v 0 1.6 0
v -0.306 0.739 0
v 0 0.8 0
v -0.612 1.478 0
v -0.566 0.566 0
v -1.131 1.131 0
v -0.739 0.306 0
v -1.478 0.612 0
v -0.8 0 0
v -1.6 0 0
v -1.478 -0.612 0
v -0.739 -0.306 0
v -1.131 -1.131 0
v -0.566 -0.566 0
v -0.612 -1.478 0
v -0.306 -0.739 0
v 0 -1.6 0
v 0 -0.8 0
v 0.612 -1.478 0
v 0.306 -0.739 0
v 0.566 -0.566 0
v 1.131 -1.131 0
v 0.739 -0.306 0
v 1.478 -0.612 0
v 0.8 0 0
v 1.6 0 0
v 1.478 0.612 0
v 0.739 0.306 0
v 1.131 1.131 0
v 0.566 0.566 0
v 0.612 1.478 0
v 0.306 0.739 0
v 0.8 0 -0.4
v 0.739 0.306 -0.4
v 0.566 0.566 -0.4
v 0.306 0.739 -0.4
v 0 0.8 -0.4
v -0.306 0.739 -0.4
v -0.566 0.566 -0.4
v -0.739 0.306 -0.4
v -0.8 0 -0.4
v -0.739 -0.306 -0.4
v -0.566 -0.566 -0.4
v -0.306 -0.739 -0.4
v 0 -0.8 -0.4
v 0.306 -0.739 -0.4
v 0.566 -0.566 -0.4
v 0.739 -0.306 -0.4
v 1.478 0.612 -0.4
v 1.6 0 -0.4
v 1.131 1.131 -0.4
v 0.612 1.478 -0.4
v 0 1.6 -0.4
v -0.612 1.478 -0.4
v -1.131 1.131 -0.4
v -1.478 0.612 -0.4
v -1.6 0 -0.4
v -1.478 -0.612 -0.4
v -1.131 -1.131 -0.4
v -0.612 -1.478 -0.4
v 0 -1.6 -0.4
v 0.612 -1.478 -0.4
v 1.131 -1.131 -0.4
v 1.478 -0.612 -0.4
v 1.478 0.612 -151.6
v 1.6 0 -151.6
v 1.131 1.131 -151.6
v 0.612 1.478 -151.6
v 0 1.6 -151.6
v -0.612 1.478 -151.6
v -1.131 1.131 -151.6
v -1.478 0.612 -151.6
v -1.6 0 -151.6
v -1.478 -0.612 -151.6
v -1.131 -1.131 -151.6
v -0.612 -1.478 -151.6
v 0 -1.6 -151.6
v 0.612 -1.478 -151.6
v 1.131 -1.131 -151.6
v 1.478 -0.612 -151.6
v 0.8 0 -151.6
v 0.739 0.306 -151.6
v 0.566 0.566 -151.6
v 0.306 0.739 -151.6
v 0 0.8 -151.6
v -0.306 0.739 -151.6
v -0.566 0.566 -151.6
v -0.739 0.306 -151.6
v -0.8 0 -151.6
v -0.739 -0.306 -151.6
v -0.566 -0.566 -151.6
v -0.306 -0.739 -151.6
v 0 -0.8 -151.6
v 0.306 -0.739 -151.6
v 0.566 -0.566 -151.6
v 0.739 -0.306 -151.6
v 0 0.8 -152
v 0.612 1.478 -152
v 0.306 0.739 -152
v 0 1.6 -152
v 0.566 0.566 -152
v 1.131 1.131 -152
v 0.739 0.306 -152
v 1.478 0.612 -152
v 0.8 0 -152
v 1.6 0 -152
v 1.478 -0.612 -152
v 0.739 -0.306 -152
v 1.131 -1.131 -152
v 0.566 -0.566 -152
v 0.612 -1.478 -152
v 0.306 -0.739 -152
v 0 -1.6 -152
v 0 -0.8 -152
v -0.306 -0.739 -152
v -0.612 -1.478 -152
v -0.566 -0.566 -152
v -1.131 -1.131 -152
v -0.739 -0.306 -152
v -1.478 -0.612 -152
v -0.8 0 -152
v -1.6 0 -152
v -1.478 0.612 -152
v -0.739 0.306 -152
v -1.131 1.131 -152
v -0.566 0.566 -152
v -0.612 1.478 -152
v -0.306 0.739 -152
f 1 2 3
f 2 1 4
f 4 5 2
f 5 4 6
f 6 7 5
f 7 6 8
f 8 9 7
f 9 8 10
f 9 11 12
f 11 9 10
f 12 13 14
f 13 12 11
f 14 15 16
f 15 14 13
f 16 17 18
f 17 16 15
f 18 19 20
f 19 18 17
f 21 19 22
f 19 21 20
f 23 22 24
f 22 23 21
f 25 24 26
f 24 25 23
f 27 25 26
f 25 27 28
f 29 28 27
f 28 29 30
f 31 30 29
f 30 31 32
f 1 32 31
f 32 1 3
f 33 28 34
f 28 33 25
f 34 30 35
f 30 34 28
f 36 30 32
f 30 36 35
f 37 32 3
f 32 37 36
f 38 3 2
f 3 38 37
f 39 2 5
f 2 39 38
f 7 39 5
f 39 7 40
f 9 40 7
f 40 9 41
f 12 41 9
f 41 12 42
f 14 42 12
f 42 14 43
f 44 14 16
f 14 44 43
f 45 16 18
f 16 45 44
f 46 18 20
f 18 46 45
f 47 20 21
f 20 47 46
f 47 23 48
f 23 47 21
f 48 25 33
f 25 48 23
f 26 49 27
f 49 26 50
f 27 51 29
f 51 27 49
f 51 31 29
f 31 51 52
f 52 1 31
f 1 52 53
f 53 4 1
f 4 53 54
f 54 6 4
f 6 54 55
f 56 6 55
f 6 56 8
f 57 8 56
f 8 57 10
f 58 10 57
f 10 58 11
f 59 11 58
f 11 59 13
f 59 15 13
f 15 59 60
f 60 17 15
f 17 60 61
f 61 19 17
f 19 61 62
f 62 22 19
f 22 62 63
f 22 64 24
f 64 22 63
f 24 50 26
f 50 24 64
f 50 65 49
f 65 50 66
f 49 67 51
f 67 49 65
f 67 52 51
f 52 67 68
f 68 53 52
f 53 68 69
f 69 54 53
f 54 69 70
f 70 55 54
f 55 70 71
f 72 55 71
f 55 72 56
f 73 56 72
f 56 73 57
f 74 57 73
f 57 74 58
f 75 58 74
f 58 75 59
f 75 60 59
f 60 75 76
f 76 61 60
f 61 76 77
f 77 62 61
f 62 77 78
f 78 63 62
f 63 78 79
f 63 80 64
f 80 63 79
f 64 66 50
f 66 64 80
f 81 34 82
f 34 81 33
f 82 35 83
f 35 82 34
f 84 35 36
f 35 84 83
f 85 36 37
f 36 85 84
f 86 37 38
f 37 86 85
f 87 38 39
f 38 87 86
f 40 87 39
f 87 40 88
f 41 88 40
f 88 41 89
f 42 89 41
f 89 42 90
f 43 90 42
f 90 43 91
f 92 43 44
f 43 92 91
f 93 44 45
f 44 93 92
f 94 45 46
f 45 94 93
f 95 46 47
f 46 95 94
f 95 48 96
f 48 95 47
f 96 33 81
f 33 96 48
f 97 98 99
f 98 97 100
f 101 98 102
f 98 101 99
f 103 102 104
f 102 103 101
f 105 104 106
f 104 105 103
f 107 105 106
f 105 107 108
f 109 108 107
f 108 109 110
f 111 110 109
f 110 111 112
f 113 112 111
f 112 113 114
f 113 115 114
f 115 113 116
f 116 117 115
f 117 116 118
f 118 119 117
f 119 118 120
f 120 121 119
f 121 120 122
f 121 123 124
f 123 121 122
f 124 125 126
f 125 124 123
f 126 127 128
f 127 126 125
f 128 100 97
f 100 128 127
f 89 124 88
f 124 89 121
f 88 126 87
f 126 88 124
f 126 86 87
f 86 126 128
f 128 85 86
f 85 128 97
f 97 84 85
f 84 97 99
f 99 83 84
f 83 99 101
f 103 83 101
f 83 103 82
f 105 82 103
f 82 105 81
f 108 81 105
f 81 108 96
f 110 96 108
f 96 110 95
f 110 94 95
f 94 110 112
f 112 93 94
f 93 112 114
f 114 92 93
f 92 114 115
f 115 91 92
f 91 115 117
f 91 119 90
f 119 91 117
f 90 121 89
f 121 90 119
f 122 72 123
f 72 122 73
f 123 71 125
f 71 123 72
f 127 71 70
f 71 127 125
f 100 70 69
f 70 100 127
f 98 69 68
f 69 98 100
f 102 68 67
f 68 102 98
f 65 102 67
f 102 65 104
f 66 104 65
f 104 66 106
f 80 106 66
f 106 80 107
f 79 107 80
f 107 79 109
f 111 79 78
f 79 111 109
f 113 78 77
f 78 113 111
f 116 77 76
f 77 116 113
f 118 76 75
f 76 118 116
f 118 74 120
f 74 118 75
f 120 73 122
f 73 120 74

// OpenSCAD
// file: ../p/4-4ring1.scad
use <../lib.scad>
function ldraw_lib__4_4ring1() = [
// 0 Ring  1 x 1.0
// 0 Name: 4-4ring1.dat
// 0 Author: James Jessiman
// 0 !LDRAW_ORG Primitive UPDATE 2009-01
// 0 !LICENSE Licensed under CC BY 2.0 and CC BY 4.0 : see CAreadme.txt
// 
// 0 BFC CERTIFY CCW
  [0,"BFC","CERTIFY"],
  [0,"BFC","CCW"],
// 
// 0 !HISTORY 1998-12-15 [PTadmin] Official Update 1998-10
// 0 !HISTORY 2002-04-08 [BrickCaster] Modified for BFC compliance
// 0 !HISTORY 2002-04-25 [PTadmin] Official Update 2002-02
// 0 !HISTORY 2007-06-24 [PTadmin] Header formatted for Contributor Agreement
// 0 !HISTORY 2008-07-01 [PTadmin] Official Update 2008-01
// 0 !HISTORY 2008-08-26 [cwdee] Switch polygon winding and rename
// 0 !HISTORY 2009-05-02 [PTadmin] Official Update 2009-01
// 
// 
// 4 16 -0.7654 0 1.8478 -0.3827 0 0.9239 0 0 1 0 0 2
  [4,16,-0.7654,0,1.8478,-0.3827,0,0.9239,0,0,1,0,0,2],
// 4 16 -1.4142 0 1.4142 -0.7071 0 0.7071 -0.3827 0 0.9239 -0.7654 0 1.8478
  [4,16,-1.4142,0,1.4142,-0.7071,0,0.7071,-0.3827,0,0.9239,-0.7654,0,1.8478],
// 4 16 -1.8478 0 0.7654 -0.9239 0 0.3827 -0.7071 0 0.7071 -1.4142 0 1.41420
  [4,16,-1.8478,0,0.7654,-0.9239,0,0.3827,-0.7071,0,0.7071,-1.4142,0,1.41420],
// 4 16 -2 0 0 -1 0 0 -0.9239 0 0.3827 -1.8478 0 0.7654
  [4,16,-2,0,0,-1,0,0,-0.9239,0,0.3827,-1.8478,0,0.7654],
// 4 16 -1.8478 0 -0.7654 -0.9239 0 -0.3827 -1 0 0 -2 0 0
  [4,16,-1.8478,0,-0.7654,-0.9239,0,-0.3827,-1,0,0,-2,0,0],
// 4 16 -1.4142 0 -1.4142 -0.7071 0 -0.7071 -0.9239 0 -0.3827 -1.8478 0 -0.7654
  [4,16,-1.4142,0,-1.4142,-0.7071,0,-0.7071,-0.9239,0,-0.3827,-1.8478,0,-0.7654],
// 4 16 -0.7654 0 -1.8478 -0.3827 0 -0.9239 -0.7071 0 -0.7071 -1.4142 0 -1.4142
  [4,16,-0.7654,0,-1.8478,-0.3827,0,-0.9239,-0.7071,0,-0.7071,-1.4142,0,-1.4142],
// 4 16 0 0 -2 0 0 -1 -0.3827 0 -0.9239 -0.7654 0 -1.8478
  [4,16,0,0,-2,0,0,-1,-0.3827,0,-0.9239,-0.7654,0,-1.8478],
// 4 16 0.7654 0 -1.8478 0.3827 0 -0.9239 0 0 -1 0 0 -2
  [4,16,0.7654,0,-1.8478,0.3827,0,-0.9239,0,0,-1,0,0,-2],
// 4 16 1.4142 0 -1.4142 0.7071 0 -0.7071 0.3827 0 -0.9239 0.7654 0 -1.8478
  [4,16,1.4142,0,-1.4142,0.7071,0,-0.7071,0.3827,0,-0.9239,0.7654,0,-1.8478],
// 4 16 1.8478 0 -0.7654 0.9239 0 -0.3827 0.7071 0 -0.7071 1.4142 0 -1.4142
  [4,16,1.8478,0,-0.7654,0.9239,0,-0.3827,0.7071,0,-0.7071,1.4142,0,-1.4142],
// 4 16 2 0 0 1 0 0 0.9239 0 -0.3827 1.8478 0 -0.7654
  [4,16,2,0,0,1,0,0,0.9239,0,-0.3827,1.8478,0,-0.7654],
// 4 16 1.8478 0 0.7654 0.9239 0 0.3827 1 0 0 2 0 0
  [4,16,1.8478,0,0.7654,0.9239,0,0.3827,1,0,0,2,0,0],
// 4 16 1.4142 0 1.4142 0.7071 0 0.7071 0.9239 0 0.3827 1.8478 0 0.7654
  [4,16,1.4142,0,1.4142,0.7071,0,0.7071,0.9239,0,0.3827,1.8478,0,0.7654],
// 4 16 0.7654 0 1.8478 0.3827 0 0.9239 0.7071 0 0.7071 1.4142 0 1.4142
  [4,16,0.7654,0,1.8478,0.3827,0,0.9239,0.7071,0,0.7071,1.4142,0,1.4142],
// 4 16 0 0 2 0 0 1 0.3827 0 0.9239 0.7654 0 1.8478
  [4,16,0,0,2,0,0,1,0.3827,0,0.9239,0.7654,0,1.8478],
// 0
];
makepoly(ldraw_lib__4_4ring1(), line=0.2);
// file: ../p/4-4edge.scad
use <../lib.scad>
function ldraw_lib__4_4edge() = [
// 0 Circle 1.0
// 0 Name: 4-4edge.dat
// 0 Author: James Jessiman
// 0 !LDRAW_ORG Primitive UPDATE 2017-01
// 0 !LICENSE Licensed under CC BY 2.0 and CC BY 4.0 : see CAreadme.txt
// 
// 0 BFC CERTIFY CCW
  [0,"BFC","CERTIFY"],
  [0,"BFC","CCW"],
// 
// 0 !HISTORY 1998-12-15 [PTadmin] Official Update 1998-10
// 0 !HISTORY 2005-12-28 [PTadmin] Official Update 2005-01
// 0 !HISTORY 2007-06-24 [PTadmin] Header formatted for Contributor Agreement
// 0 !HISTORY 2008-07-01 [PTadmin] Official Update 2008-01
// 0 !HISTORY 2017-01-15 [Steffen] BFCed
// 0 !HISTORY 2017-12-30 [PTadmin] Official Update 2017-01
// 
// 
// 2 24 1 0 0 0.9239 0 0.3827
  [2,24,1,0,0,0.9239,0,0.3827],
// 2 24 0.9239 0 0.3827 0.7071 0 0.7071
  [2,24,0.9239,0,0.3827,0.7071,0,0.7071],
// 2 24 0.7071 0 0.7071 0.3827 0 0.9239
  [2,24,0.7071,0,0.7071,0.3827,0,0.9239],
// 2 24 0.3827 0 0.9239 0 0 1
  [2,24,0.3827,0,0.9239,0,0,1],
// 2 24 0 0 1 -0.3827 0 0.9239
  [2,24,0,0,1,-0.3827,0,0.9239],
// 2 24 -0.3827 0 0.9239 -0.7071 0 0.7071
  [2,24,-0.3827,0,0.9239,-0.7071,0,0.7071],
// 2 24 -0.7071 0 0.7071 -0.9239 0 0.3827
  [2,24,-0.7071,0,0.7071,-0.9239,0,0.3827],
// 2 24 -0.9239 0 0.3827 -1 0 -0
  [2,24,-0.9239,0,0.3827,-1,0,-0],
// 2 24 -1 0 -0 -0.9239 0 -0.3827
  [2,24,-1,0,-0,-0.9239,0,-0.3827],
// 2 24 -0.9239 0 -0.3827 -0.7071 0 -0.7071
  [2,24,-0.9239,0,-0.3827,-0.7071,0,-0.7071],
// 2 24 -0.7071 0 -0.7071 -0.3827 0 -0.9239
  [2,24,-0.7071,0,-0.7071,-0.3827,0,-0.9239],
// 2 24 -0.3827 0 -0.9239 0 0 -1
  [2,24,-0.3827,0,-0.9239,0,0,-1],
// 2 24 0 0 -1 0.3827 0 -0.9239
  [2,24,0,0,-1,0.3827,0,-0.9239],
// 2 24 0.3827 0 -0.9239 0.7071 0 -0.7071
  [2,24,0.3827,0,-0.9239,0.7071,0,-0.7071],
// 2 24 0.7071 0 -0.7071 0.9239 0 -0.3827
  [2,24,0.7071,0,-0.7071,0.9239,0,-0.3827],
// 2 24 0.9239 0 -0.3827 1 0 0
  [2,24,0.9239,0,-0.3827,1,0,0],
];
makepoly(ldraw_lib__4_4edge(), line=0.2);
// file: ../p/4-4cyli.scad
use <../lib.scad>
function ldraw_lib__4_4cyli() = [
// 0 Cylinder 1.0
// 0 Name: 4-4cyli.dat
// 0 Author: James Jessiman
// 0 !LDRAW_ORG Primitive UPDATE 2005-01
// 0 !LICENSE Licensed under CC BY 2.0 and CC BY 4.0 : see CAreadme.txt
// 
// 0 BFC CERTIFY CCW
  [0,"BFC","CERTIFY"],
  [0,"BFC","CCW"],
// 
// 0 !HISTORY 1998-12-15 [PTadmin] Official Update 1998-10
// 0 !HISTORY 2002-03-23 [sbliss] Added BFC statement; merged headers from files in distributions LDraw 0.27 and Complete.
// 0 !HISTORY 2002-04-25 [PTadmin] Official Update 2002-02
// 0 !HISTORY 2004-12-14 [guyvivan] BFC CCW
// 0 !HISTORY 2005-12-28 [PTadmin] Official Update 2005-01
// 0 !HISTORY 2007-06-24 [PTadmin] Header formatted for Contributor Agreement
// 0 !HISTORY 2008-07-01 [PTadmin] Official Update 2008-01
// 
// 
// 4 16 1 1 0 0.9239 1 0.3827 0.9239 0 0.3827 1 0 0
  [4,16,1,1,0,0.9239,1,0.3827,0.9239,0,0.3827,1,0,0],
// 5 24 1 0 0 1 1 0 0.9239 0 0.3827 0.9239 0 -0.3827
  [5,24,1,0,0,1,1,0,0.9239,0,0.3827,0.9239,0,-0.3827],
// 4 16 0.9239 1 0.3827 0.7071 1 0.7071 0.7071 0 0.7071 0.9239 0 0.3827
  [4,16,0.9239,1,0.3827,0.7071,1,0.7071,0.7071,0,0.7071,0.9239,0,0.3827],
// 5 24 0.9239 0 0.3827 0.9239 1 0.3827 0.7071 0 0.7071 1 0 0
  [5,24,0.9239,0,0.3827,0.9239,1,0.3827,0.7071,0,0.7071,1,0,0],
// 4 16 0.7071 1 0.7071 0.3827 1 0.9239 0.3827 0 0.9239 0.7071 0 0.7071
  [4,16,0.7071,1,0.7071,0.3827,1,0.9239,0.3827,0,0.9239,0.7071,0,0.7071],
// 5 24 0.7071 0 0.7071 0.7071 1 0.7071 0.3827 0 0.9239 0.9239 0 0.3827
  [5,24,0.7071,0,0.7071,0.7071,1,0.7071,0.3827,0,0.9239,0.9239,0,0.3827],
// 4 16 0.3827 1 0.9239 0 1 1 0 0 1 0.3827 0 0.9239
  [4,16,0.3827,1,0.9239,0,1,1,0,0,1,0.3827,0,0.9239],
// 5 24 0.3827 0 0.9239 0.3827 1 0.9239 0 0 1 0.7071 0 0.7071
  [5,24,0.3827,0,0.9239,0.3827,1,0.9239,0,0,1,0.7071,0,0.7071],
// 4 16 0 1 1 -0.3827 1 0.9239 -0.3827 0 0.9239 0 0 1
  [4,16,0,1,1,-0.3827,1,0.9239,-0.3827,0,0.9239,0,0,1],
// 5 24 0 0 1 0 1 1 -0.3827 0 0.9239 0.3827 0 0.9239
  [5,24,0,0,1,0,1,1,-0.3827,0,0.9239,0.3827,0,0.9239],
// 4 16 -0.3827 1 0.9239 -0.7071 1 0.7071 -0.7071 0 0.7071 -0.3827 0 0.9239
  [4,16,-0.3827,1,0.9239,-0.7071,1,0.7071,-0.7071,0,0.7071,-0.3827,0,0.9239],
// 5 24 -0.3827 0 0.9239 -0.3827 1 0.9239 -0.7071 0 0.7071 0 0 1
  [5,24,-0.3827,0,0.9239,-0.3827,1,0.9239,-0.7071,0,0.7071,0,0,1],
// 4 16 -0.7071 1 0.7071 -0.9239 1 0.3827 -0.9239 0 0.3827 -0.7071 0 0.7071
  [4,16,-0.7071,1,0.7071,-0.9239,1,0.3827,-0.9239,0,0.3827,-0.7071,0,0.7071],
// 5 24 -0.7071 0 0.7071 -0.7071 1 0.7071 -0.9239 0 0.3827 -0.3827 0 0.9239
  [5,24,-0.7071,0,0.7071,-0.7071,1,0.7071,-0.9239,0,0.3827,-0.3827,0,0.9239],
// 4 16 -0.9239 1 0.3827 -1 1 0 -1 0 0 -0.9239 0 0.3827
  [4,16,-0.9239,1,0.3827,-1,1,0,-1,0,0,-0.9239,0,0.3827],
// 5 24 -0.9239 0 0.3827 -0.9239 1 0.3827 -1 0 0 -0.7071 0 0.7071
  [5,24,-0.9239,0,0.3827,-0.9239,1,0.3827,-1,0,0,-0.7071,0,0.7071],
// 4 16 -1 1 0 -0.9239 1 -0.3827 -0.9239 0 -0.3827 -1 0 0
  [4,16,-1,1,0,-0.9239,1,-0.3827,-0.9239,0,-0.3827,-1,0,0],
// 5 24 -1 0 0 -1 1 0 -0.9239 0 -0.3827 -0.9239 0 0.3827
  [5,24,-1,0,0,-1,1,0,-0.9239,0,-0.3827,-0.9239,0,0.3827],
// 4 16 -0.9239 1 -0.3827 -0.7071 1 -0.7071 -0.7071 0 -0.7071 -0.9239 0 -0.3827
  [4,16,-0.9239,1,-0.3827,-0.7071,1,-0.7071,-0.7071,0,-0.7071,-0.9239,0,-0.3827],
// 5 24 -0.9239 0 -0.3827 -0.9239 1 -0.3827 -0.7071 0 -0.7071 -1 0 0
  [5,24,-0.9239,0,-0.3827,-0.9239,1,-0.3827,-0.7071,0,-0.7071,-1,0,0],
// 4 16 -0.7071 1 -0.7071 -0.3827 1 -0.9239 -0.3827 0 -0.9239 -0.7071 0 -0.7071
  [4,16,-0.7071,1,-0.7071,-0.3827,1,-0.9239,-0.3827,0,-0.9239,-0.7071,0,-0.7071],
// 5 24 -0.7071 0 -0.7071 -0.7071 1 -0.7071 -0.3827 0 -0.9239 -0.9239 0 -0.3827
  [5,24,-0.7071,0,-0.7071,-0.7071,1,-0.7071,-0.3827,0,-0.9239,-0.9239,0,-0.3827],
// 4 16 -0.3827 1 -0.9239 0 1 -1 0 0 -1 -0.3827 0 -0.9239
  [4,16,-0.3827,1,-0.9239,0,1,-1,0,0,-1,-0.3827,0,-0.9239],
// 5 24 -0.3827 0 -0.9239 -0.3827 1 -0.9239 0 0 -1 -0.7071 0 -0.7071
  [5,24,-0.3827,0,-0.9239,-0.3827,1,-0.9239,0,0,-1,-0.7071,0,-0.7071],
// 4 16 0 1 -1 0.3827 1 -0.9239 0.3827 0 -0.9239 0 0 -1
  [4,16,0,1,-1,0.3827,1,-0.9239,0.3827,0,-0.9239,0,0,-1],
// 5 24 0 0 -1 0 1 -1 0.3827 0 -0.9239 -0.3827 0 -0.9239
  [5,24,0,0,-1,0,1,-1,0.3827,0,-0.9239,-0.3827,0,-0.9239],
// 4 16 0.3827 1 -0.9239 0.7071 1 -0.7071 0.7071 0 -0.7071 0.3827 0 -0.9239
  [4,16,0.3827,1,-0.9239,0.7071,1,-0.7071,0.7071,0,-0.7071,0.3827,0,-0.9239],
// 5 24 0.3827 0 -0.9239 0.3827 1 -0.9239 0.7071 0 -0.7071 0 0 -1
  [5,24,0.3827,0,-0.9239,0.3827,1,-0.9239,0.7071,0,-0.7071,0,0,-1],
// 4 16 0.7071 1 -0.7071 0.9239 1 -0.3827 0.9239 0 -0.3827 0.7071 0 -0.7071
  [4,16,0.7071,1,-0.7071,0.9239,1,-0.3827,0.9239,0,-0.3827,0.7071,0,-0.7071],
// 5 24 0.7071 0 -0.7071 0.7071 1 -0.7071 0.9239 0 -0.3827 0.3827 0 -0.9239
  [5,24,0.7071,0,-0.7071,0.7071,1,-0.7071,0.9239,0,-0.3827,0.3827,0,-0.9239],
// 4 16 0.9239 1 -0.3827 1 1 0 1 0 0 0.9239 0 -0.3827
  [4,16,0.9239,1,-0.3827,1,1,0,1,0,0,0.9239,0,-0.3827],
// 5 24 0.9239 0 -0.3827 0.9239 1 -0.3827 1 0 0 0.7071 0 -0.7071
  [5,24,0.9239,0,-0.3827,0.9239,1,-0.3827,1,0,0,0.7071,0,-0.7071],
// 0
];
makepoly(ldraw_lib__4_4cyli(), line=0.2);
// file: u9053.scad
use <../lib.scad>
use <../p/4-4cyli.scad>
use <../p/4-4edge.scad>
use <../p/4-4ring1.scad>
function ldraw_lib__u9053() = [
// 0 ~Technic Flex-System Hose End
// 0 Name: u9053.dat
// 0 Author: William Howard [WilliamH]
// 0 !LDRAW_ORG Part UPDATE 2011-02
// 0 !LICENSE Licensed under CC BY 2.0 and CC BY 4.0 : see CAreadme.txt
// 
// 0 BFC CERTIFY CCW
  [0,"BFC","CERTIFY"],
  [0,"BFC","CCW"],
// 
// 0 !HISTORY 2011-12-21 [cwdee] Reworked subparting technique
// 0 !HISTORY 2011-12-23 [PTadmin] Renamed from 76
// 0 !HISTORY 2011-12-29 [PTadmin] Official Update 2011-02
// 
// 
// 1 16 0 0 0 2 0 0 0 1 0 0 0 2 4-4ring1.dat
  [1,16,0,0,0,2,0,0,0,1,0,0,0,2, ldraw_lib__4_4ring1()],
// 1 16 0 0 0 2 0 0 0 1 0 0 0 2 4-4edge.dat
  [1,16,0,0,0,2,0,0,0,1,0,0,0,2, ldraw_lib__4_4edge()],
// 0 BFC INVERTNEXT
  [0,"BFC","INVERTNEXT"],
// 1 16 0 0 0 2 0 0 0 1 0 0 0 2 4-4cyli.dat
  [1,16,0,0,0,2,0,0,0,1,0,0,0,2, ldraw_lib__4_4cyli()],
// 1 16 0 0 0 4 0 0 0 1 0 0 0 4 4-4edge.dat
  [1,16,0,0,0,4,0,0,0,1,0,0,0,4, ldraw_lib__4_4edge()],
// 1 16 0 0 0 4 0 0 0 1 0 0 0 4 4-4cyli.dat
  [1,16,0,0,0,4,0,0,0,1,0,0,0,4, ldraw_lib__4_4cyli()],
// 0
];
makepoly(ldraw_lib__u9053(), line=0.2);
// file: 77.scad
use <../lib.scad>
use <../p/4-4cyli.scad>
function ldraw_lib__77() = [
// 0 ~Technic Flex-System Hose Segment
// 0 Name: 77.dat
// 0 Author: William Howard [WilliamH]
// 0 !LDRAW_ORG Part UPDATE 2011-02
// 0 !LICENSE Licensed under CC BY 2.0 and CC BY 4.0 : see CAreadme.txt
// 
// 0 BFC CERTIFY CCW
  [0,"BFC","CERTIFY"],
  [0,"BFC","CCW"],
// 
// 0 !HISTORY 2011-12-21 [cwdee] Reworked subparting technique
// 0 !HISTORY 2011-12-29 [PTadmin] Official Update 2011-02
// 
// 
// 1 16 0 0 0 4 0 0 0 1 0 0 0 4 4-4cyli.dat
  [1,16,0,0,0,4,0,0,0,1,0,0,0,4, ldraw_lib__4_4cyli()],
// 0 BFC INVERTNEXT
  [0,"BFC","INVERTNEXT"],
// 1 16 0 0 0 2 0 0 0 1 0 0 0 2 4-4cyli.dat
  [1,16,0,0,0,2,0,0,0,1,0,0,0,2, ldraw_lib__4_4cyli()],
// 0
];
makepoly(ldraw_lib__77(), line=0.2);
// main file
use <../lib.scad>
use <77.scad>
use <u9053.scad>
function ldraw_lib__22463() = [
// 0 Technic Flex-System Hose 19L (380LDU)
// 0 Name: 22463.dat
// 0 Author: Tim Gould [timgould]
// 0 !LDRAW_ORG Part UPDATE 2011-02
// 0 !LICENSE Licensed under CC BY 2.0 and CC BY 4.0 : see CAreadme.txt
// 
// 0 BFC CERTIFY CCW
  [0,"BFC","CERTIFY"],
  [0,"BFC","CCW"],
// 
// 0 !KEYWORDS bar, tube
// 
// 0 !HISTORY 2011-12-29 [PTadmin] Official Update 2011-02
// 
// 
// 1 16 0 0 0 1 0 0 0 1 0 0 0 1 u9053.dat
  [1,16,0,0,0,1,0,0,0,1,0,0,0,1, ldraw_lib__u9053()],
// 1 16 0 1 0 1 0 0 0 378 0 0 0 1 77.dat
  [1,16,0,1,0,1,0,0,0,378,0,0,0,1, ldraw_lib__77()],
// 1 16 0 380 0 -1 0 0 0 -1 0 0 0 1 u9053.dat
  [1,16,0,380,0,-1,0,0,0,-1,0,0,0,1, ldraw_lib__u9053()],
];
makepoly(ldraw_lib__22463(), line=0.2);
